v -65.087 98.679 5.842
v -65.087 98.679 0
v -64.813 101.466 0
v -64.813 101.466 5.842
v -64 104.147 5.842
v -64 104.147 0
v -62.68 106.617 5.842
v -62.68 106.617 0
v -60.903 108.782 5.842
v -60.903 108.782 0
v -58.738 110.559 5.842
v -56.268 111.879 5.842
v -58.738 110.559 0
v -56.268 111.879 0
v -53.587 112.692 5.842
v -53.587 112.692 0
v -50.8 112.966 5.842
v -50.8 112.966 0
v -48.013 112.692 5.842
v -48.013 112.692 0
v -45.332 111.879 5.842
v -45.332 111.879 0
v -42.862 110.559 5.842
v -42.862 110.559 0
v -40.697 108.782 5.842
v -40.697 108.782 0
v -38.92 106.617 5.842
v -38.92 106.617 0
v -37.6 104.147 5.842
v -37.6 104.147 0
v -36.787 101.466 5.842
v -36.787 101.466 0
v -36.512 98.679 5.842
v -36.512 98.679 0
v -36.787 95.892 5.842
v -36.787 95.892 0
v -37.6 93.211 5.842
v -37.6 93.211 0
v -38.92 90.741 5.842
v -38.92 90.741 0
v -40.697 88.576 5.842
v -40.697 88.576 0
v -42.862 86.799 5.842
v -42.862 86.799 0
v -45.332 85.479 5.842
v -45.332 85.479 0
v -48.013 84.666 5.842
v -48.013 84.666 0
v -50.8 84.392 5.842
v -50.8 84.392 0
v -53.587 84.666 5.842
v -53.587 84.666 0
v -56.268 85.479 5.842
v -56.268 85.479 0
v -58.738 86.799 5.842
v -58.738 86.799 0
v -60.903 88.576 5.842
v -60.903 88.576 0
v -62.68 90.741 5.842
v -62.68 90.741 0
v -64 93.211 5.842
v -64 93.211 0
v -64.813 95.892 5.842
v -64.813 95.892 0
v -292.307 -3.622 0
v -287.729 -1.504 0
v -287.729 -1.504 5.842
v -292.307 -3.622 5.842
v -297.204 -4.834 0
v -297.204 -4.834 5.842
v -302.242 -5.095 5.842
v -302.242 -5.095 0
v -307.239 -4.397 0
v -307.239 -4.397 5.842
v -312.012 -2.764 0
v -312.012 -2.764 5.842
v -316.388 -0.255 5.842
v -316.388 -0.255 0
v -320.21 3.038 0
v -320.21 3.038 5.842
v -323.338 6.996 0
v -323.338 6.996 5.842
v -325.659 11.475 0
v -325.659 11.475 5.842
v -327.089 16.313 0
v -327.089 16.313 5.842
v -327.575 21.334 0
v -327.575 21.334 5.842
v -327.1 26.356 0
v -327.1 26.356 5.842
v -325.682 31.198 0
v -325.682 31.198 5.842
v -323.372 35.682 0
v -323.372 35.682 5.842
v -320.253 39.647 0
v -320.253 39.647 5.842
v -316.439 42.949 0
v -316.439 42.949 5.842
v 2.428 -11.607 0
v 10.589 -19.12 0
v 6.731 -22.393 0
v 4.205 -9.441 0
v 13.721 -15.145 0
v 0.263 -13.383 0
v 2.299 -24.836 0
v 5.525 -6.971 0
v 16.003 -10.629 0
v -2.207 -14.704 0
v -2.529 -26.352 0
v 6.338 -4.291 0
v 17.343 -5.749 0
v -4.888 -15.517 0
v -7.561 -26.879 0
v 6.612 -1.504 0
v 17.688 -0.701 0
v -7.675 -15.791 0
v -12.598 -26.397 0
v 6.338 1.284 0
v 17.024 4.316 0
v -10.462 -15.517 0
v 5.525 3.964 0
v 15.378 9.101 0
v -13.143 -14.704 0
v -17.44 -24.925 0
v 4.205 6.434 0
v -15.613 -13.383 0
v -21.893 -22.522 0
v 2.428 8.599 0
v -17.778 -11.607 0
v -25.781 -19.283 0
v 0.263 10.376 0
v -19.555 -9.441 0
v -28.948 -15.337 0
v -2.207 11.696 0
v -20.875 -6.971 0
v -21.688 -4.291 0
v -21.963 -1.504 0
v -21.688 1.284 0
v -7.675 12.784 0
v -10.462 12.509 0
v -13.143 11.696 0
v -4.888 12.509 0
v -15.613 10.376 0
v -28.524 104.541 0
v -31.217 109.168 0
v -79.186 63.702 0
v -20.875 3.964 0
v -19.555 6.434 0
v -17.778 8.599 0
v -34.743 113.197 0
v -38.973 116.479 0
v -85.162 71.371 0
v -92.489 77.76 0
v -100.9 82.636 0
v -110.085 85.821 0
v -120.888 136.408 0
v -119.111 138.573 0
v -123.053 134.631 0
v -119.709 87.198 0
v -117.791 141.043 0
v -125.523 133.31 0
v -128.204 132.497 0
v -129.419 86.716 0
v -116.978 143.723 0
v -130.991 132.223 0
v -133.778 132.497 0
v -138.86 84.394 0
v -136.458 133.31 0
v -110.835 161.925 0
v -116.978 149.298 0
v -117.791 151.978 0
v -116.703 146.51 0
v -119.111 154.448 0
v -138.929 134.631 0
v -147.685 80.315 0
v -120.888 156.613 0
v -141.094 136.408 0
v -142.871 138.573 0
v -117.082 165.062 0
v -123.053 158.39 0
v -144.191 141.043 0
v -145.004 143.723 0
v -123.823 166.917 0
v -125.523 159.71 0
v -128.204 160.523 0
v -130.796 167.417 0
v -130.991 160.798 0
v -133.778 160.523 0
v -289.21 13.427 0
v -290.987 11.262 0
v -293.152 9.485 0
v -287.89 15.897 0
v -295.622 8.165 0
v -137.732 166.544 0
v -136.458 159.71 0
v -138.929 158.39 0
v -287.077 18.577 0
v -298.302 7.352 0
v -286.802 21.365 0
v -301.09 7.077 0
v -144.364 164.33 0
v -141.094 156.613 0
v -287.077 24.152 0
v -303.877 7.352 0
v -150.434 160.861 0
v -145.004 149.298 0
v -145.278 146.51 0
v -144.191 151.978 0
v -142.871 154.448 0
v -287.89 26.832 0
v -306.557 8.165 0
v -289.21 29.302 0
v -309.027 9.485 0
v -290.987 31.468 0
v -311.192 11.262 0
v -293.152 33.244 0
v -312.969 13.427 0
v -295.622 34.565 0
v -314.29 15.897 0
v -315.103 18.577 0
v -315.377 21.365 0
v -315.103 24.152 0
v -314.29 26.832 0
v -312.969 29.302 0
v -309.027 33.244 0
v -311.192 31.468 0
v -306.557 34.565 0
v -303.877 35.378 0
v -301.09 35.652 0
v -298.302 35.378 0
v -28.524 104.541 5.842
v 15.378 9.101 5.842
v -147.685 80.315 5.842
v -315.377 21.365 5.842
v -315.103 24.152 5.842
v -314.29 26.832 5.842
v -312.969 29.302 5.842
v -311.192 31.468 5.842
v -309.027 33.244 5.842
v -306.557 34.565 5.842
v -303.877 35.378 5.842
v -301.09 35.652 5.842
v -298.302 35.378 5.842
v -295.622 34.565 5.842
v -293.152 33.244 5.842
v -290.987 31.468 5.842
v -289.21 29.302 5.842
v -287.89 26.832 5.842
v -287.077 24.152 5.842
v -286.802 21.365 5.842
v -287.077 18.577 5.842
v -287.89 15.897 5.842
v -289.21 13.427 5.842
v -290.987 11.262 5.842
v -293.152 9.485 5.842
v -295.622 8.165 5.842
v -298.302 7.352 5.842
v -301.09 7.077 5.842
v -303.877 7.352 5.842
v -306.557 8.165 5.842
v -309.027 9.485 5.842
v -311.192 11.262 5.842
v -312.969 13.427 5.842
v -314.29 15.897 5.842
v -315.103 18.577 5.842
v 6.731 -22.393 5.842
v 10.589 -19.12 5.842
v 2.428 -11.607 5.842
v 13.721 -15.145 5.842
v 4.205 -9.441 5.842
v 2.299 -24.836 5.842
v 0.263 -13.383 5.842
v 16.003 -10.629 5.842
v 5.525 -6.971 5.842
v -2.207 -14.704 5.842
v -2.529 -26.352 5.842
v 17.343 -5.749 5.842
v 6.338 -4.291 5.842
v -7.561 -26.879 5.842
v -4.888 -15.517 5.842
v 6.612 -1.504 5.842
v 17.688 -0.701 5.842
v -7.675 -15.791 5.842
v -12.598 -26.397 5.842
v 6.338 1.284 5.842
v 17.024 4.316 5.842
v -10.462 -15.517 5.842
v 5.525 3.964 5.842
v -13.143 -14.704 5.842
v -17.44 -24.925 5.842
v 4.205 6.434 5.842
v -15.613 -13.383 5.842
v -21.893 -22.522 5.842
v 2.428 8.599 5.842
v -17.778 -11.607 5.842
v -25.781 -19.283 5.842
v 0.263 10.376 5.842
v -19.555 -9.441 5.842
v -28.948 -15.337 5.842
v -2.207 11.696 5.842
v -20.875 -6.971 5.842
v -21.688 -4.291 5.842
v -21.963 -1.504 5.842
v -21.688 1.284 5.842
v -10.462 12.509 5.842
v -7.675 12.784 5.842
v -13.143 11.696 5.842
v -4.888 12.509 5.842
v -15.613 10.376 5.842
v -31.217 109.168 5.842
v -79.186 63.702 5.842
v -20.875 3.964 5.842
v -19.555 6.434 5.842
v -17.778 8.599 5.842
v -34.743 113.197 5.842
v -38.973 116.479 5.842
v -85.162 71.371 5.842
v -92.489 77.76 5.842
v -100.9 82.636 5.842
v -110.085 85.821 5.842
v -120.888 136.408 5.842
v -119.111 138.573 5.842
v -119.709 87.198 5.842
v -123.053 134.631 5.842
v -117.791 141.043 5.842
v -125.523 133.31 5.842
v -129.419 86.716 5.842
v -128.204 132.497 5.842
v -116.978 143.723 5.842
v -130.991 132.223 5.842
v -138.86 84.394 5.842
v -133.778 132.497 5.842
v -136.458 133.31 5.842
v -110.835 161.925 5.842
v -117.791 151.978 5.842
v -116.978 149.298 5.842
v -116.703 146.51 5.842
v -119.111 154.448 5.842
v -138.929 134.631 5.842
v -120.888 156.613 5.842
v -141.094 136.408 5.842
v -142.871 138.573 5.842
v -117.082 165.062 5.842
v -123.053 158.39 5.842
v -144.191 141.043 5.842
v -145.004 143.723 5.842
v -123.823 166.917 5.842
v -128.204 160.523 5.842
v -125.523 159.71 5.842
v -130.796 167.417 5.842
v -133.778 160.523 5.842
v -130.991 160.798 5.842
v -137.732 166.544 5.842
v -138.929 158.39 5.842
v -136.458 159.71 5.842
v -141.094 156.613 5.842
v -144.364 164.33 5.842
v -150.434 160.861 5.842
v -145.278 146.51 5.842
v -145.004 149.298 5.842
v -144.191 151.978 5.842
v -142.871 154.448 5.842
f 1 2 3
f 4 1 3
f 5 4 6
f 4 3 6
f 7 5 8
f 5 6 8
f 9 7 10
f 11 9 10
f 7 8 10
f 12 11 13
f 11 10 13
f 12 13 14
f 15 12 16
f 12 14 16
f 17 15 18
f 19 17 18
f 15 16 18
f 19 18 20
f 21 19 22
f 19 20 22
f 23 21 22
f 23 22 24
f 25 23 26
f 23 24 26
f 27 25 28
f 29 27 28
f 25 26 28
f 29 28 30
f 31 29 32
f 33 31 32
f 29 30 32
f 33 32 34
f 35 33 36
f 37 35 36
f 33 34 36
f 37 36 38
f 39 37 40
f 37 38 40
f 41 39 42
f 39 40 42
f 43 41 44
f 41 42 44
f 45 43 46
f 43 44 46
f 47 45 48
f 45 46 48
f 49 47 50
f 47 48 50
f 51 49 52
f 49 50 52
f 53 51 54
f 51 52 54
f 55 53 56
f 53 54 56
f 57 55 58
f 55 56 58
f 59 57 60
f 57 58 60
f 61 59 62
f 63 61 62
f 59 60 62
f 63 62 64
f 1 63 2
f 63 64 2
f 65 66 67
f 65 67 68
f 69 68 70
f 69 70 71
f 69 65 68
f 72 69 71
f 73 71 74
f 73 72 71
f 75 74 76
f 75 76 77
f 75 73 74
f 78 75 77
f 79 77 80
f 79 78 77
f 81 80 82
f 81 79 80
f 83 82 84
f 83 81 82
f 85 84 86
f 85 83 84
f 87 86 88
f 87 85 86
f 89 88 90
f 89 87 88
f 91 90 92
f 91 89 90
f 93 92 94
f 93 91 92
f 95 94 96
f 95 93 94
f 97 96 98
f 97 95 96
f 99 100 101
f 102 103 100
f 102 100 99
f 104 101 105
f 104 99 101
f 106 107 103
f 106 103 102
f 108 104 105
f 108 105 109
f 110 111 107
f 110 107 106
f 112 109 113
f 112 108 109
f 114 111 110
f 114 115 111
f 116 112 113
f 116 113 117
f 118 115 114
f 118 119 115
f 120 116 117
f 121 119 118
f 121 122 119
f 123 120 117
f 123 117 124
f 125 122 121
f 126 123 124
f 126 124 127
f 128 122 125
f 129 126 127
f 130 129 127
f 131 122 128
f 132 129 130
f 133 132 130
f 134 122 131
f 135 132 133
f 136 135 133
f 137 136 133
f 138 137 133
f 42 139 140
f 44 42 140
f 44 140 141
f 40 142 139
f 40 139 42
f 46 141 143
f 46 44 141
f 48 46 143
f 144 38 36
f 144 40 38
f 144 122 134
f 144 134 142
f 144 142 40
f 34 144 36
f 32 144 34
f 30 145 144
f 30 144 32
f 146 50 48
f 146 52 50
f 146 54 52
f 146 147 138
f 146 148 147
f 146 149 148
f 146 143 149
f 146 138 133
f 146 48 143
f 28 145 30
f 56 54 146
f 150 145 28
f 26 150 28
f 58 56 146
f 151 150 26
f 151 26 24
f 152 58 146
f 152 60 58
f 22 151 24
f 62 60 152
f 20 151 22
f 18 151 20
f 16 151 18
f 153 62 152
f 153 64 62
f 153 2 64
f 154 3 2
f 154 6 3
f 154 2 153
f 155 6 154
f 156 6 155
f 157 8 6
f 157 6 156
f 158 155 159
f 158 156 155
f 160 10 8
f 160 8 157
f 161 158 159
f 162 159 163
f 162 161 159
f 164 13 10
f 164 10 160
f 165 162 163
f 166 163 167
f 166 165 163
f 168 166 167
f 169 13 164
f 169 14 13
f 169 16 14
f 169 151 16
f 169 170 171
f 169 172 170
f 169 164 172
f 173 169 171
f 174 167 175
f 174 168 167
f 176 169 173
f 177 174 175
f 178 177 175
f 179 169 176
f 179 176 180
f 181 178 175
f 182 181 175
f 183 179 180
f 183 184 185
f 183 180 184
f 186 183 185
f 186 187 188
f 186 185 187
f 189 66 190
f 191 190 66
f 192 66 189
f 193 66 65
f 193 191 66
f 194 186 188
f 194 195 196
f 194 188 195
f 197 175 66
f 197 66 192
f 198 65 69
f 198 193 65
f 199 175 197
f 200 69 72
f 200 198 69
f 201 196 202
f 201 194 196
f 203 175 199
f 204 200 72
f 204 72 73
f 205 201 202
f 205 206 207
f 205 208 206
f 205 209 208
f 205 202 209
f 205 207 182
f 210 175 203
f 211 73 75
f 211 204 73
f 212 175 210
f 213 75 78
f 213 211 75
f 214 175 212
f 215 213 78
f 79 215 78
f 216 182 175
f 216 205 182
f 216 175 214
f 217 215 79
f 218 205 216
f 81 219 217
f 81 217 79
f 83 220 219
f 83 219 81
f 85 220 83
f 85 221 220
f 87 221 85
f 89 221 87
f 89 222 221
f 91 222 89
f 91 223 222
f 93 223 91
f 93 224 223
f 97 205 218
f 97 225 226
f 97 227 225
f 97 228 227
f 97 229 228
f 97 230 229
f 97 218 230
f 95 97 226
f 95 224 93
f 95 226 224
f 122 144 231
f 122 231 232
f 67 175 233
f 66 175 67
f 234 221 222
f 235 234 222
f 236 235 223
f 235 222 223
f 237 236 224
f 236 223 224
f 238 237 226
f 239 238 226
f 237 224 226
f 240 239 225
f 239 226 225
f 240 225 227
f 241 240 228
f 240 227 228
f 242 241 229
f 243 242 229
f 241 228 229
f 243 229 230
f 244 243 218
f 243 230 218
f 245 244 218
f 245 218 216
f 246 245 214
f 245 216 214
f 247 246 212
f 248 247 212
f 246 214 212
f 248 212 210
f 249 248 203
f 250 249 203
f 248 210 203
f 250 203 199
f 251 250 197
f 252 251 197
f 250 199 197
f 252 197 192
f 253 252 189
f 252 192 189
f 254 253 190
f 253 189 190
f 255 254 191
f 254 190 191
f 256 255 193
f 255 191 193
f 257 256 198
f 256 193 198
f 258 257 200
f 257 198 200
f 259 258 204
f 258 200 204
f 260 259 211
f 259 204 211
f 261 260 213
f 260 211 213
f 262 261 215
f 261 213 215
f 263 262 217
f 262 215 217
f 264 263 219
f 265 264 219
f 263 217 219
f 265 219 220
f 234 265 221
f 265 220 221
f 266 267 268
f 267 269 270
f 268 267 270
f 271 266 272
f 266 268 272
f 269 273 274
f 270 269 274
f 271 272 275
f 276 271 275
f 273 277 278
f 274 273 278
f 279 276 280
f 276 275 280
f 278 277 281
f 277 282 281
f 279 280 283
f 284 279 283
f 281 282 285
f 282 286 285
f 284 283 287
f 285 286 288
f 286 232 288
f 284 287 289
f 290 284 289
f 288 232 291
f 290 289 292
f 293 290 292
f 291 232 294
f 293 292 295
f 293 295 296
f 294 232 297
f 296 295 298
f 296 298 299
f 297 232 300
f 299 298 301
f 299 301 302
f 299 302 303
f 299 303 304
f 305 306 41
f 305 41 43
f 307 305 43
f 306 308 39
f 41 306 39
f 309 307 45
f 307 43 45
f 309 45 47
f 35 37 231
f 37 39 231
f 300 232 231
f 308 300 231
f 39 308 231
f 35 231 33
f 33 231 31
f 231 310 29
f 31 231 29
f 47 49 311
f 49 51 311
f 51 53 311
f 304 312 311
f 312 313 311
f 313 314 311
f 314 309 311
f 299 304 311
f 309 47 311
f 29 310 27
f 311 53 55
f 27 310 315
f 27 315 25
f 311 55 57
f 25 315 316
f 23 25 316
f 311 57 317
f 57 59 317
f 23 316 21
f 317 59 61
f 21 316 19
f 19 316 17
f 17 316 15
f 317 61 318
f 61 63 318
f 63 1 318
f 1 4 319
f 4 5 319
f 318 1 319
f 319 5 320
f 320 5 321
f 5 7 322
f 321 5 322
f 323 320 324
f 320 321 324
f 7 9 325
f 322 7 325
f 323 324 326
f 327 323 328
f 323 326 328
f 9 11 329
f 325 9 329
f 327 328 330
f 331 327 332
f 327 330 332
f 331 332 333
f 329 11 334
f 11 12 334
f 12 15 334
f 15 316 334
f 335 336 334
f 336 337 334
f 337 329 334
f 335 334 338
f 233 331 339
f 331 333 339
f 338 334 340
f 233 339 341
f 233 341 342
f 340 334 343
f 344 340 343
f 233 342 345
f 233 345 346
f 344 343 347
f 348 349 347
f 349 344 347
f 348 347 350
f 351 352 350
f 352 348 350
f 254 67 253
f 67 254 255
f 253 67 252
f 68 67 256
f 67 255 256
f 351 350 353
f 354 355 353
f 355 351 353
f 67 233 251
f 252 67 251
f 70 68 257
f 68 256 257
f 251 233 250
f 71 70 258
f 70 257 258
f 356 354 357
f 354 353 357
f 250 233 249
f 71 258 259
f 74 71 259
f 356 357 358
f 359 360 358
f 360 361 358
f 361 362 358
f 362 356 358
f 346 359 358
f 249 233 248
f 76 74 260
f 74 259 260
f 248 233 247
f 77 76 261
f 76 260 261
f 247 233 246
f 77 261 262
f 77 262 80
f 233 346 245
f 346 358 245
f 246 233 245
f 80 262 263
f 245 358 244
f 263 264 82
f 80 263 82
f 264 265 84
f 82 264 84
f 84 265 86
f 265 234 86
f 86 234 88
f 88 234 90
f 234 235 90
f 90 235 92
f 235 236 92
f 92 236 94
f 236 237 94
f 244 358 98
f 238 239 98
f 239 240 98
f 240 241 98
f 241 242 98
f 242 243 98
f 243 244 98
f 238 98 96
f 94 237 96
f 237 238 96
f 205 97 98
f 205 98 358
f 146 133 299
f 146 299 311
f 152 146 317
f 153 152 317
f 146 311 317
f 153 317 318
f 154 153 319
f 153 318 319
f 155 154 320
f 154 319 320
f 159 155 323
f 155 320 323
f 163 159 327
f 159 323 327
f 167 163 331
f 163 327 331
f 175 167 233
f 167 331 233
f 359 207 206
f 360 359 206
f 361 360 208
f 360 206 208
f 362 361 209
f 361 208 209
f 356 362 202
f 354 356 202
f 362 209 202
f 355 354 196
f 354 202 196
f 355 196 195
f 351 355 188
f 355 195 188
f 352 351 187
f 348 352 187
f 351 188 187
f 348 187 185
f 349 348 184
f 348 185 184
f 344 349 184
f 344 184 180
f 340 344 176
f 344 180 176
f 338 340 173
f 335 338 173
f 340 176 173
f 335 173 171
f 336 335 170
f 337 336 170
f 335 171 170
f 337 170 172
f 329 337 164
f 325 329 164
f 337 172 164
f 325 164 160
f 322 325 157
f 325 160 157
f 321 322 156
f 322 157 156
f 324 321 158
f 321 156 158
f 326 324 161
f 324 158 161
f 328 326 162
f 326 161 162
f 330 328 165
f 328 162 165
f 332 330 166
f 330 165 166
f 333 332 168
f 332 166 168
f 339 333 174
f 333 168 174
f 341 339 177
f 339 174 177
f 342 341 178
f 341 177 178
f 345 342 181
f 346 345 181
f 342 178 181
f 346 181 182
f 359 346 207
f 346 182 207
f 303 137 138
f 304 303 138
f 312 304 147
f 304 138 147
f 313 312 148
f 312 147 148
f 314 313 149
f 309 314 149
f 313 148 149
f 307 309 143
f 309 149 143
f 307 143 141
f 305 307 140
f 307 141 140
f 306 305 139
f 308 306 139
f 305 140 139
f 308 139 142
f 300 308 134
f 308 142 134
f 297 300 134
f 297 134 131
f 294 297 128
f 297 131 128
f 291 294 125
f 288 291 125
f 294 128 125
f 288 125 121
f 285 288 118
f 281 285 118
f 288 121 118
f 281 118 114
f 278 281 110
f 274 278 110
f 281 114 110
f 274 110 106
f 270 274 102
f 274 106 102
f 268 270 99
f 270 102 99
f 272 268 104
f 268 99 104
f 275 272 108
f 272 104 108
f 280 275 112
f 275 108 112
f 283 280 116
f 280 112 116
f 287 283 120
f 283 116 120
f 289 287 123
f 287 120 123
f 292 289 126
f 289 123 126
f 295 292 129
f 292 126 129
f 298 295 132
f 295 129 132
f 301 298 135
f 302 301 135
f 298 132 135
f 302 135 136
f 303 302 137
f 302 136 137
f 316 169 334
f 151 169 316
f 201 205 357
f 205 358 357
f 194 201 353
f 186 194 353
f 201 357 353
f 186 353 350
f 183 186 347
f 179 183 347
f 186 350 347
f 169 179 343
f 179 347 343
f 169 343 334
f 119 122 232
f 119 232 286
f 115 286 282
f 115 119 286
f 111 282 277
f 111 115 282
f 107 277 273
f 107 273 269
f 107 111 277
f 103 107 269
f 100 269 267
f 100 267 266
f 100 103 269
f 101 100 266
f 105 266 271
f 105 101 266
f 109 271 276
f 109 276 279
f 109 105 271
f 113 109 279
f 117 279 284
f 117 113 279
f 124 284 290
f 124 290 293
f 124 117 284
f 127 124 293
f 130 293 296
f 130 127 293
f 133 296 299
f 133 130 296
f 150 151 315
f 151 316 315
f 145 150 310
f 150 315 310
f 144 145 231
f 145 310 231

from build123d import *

# Parameters (mm, degrees)
SKETCH1_R           = 14.2875
BOSS_EXTRUDE1_DEPTH = 5.842
FILLET6_R           = 35.56
FILLET10_R          = 27.94
FILLET13_R          = 50.8


with BuildPart() as part:
    # Sketch1 → Boss-Extrude1 (new body)
    with BuildSketch(Plane(origin=(0, 0, 0), x_dir=(-1, 0, 0), z_dir=(0, 0, -1))):
        with BuildLine():
            Line((316.43857867, 42.94910124), (130.990896358, 174.671247093))
            Line((130.990896358, 174.671247093), (31.981087973, 112.057039535))
            Line((31.981087973, 112.057039535), (-15.378230565, 9.100654441))
            ThreePointArc((-15.378230565, 9.100654441), (-4.576133352, -23.72569398), (28.948253716, -15.337015504))
            Line((28.948253716, -15.337015504), (105.434059084, 104.999617888))
            Line((105.434059084, 104.999617888), (287.729052218, -1.503728312))
            ThreePointArc((287.729052218, -1.503728312), (323.338289689, 6.995643737), (316.43857867, 42.94910124))
        make_face()
        with Locations((301.089652101, 21.3647594)):
            Circle(SKETCH1_R, mode=Mode.SUBTRACT)
        with Locations((130.990896358, 146.510317071)):
            Circle(SKETCH1_R, mode=Mode.SUBTRACT)
        with Locations((50.8, 98.679)):
            Circle(SKETCH1_R, mode=Mode.SUBTRACT)
        with Locations((7.675076536, -1.503728312)):
            Circle(SKETCH1_R, mode=Mode.SUBTRACT)
    extrude(amount=-BOSS_EXTRUDE1_DEPTH)

    # Fillet6
    fillet6_edges = [part.edges().sort_by_distance(p)[0] for p in [
        (-130.990896358, 174.671247093, 2.921),
    ]]
    fillet(fillet6_edges, radius=FILLET6_R)

    # Fillet10
    fillet10_edges = [part.edges().sort_by_distance(p)[0] for p in [
        (-31.981087973, 112.057039535, 2.921),
    ]]
    fillet(fillet10_edges, radius=FILLET10_R)

    # Fillet13
    fillet13_edges = [part.edges().sort_by_distance(p)[0] for p in [
        (-105.434059084, 104.999617888, 2.921),
    ]]
    fillet(fillet13_edges, radius=FILLET13_R)


solid = part.part
